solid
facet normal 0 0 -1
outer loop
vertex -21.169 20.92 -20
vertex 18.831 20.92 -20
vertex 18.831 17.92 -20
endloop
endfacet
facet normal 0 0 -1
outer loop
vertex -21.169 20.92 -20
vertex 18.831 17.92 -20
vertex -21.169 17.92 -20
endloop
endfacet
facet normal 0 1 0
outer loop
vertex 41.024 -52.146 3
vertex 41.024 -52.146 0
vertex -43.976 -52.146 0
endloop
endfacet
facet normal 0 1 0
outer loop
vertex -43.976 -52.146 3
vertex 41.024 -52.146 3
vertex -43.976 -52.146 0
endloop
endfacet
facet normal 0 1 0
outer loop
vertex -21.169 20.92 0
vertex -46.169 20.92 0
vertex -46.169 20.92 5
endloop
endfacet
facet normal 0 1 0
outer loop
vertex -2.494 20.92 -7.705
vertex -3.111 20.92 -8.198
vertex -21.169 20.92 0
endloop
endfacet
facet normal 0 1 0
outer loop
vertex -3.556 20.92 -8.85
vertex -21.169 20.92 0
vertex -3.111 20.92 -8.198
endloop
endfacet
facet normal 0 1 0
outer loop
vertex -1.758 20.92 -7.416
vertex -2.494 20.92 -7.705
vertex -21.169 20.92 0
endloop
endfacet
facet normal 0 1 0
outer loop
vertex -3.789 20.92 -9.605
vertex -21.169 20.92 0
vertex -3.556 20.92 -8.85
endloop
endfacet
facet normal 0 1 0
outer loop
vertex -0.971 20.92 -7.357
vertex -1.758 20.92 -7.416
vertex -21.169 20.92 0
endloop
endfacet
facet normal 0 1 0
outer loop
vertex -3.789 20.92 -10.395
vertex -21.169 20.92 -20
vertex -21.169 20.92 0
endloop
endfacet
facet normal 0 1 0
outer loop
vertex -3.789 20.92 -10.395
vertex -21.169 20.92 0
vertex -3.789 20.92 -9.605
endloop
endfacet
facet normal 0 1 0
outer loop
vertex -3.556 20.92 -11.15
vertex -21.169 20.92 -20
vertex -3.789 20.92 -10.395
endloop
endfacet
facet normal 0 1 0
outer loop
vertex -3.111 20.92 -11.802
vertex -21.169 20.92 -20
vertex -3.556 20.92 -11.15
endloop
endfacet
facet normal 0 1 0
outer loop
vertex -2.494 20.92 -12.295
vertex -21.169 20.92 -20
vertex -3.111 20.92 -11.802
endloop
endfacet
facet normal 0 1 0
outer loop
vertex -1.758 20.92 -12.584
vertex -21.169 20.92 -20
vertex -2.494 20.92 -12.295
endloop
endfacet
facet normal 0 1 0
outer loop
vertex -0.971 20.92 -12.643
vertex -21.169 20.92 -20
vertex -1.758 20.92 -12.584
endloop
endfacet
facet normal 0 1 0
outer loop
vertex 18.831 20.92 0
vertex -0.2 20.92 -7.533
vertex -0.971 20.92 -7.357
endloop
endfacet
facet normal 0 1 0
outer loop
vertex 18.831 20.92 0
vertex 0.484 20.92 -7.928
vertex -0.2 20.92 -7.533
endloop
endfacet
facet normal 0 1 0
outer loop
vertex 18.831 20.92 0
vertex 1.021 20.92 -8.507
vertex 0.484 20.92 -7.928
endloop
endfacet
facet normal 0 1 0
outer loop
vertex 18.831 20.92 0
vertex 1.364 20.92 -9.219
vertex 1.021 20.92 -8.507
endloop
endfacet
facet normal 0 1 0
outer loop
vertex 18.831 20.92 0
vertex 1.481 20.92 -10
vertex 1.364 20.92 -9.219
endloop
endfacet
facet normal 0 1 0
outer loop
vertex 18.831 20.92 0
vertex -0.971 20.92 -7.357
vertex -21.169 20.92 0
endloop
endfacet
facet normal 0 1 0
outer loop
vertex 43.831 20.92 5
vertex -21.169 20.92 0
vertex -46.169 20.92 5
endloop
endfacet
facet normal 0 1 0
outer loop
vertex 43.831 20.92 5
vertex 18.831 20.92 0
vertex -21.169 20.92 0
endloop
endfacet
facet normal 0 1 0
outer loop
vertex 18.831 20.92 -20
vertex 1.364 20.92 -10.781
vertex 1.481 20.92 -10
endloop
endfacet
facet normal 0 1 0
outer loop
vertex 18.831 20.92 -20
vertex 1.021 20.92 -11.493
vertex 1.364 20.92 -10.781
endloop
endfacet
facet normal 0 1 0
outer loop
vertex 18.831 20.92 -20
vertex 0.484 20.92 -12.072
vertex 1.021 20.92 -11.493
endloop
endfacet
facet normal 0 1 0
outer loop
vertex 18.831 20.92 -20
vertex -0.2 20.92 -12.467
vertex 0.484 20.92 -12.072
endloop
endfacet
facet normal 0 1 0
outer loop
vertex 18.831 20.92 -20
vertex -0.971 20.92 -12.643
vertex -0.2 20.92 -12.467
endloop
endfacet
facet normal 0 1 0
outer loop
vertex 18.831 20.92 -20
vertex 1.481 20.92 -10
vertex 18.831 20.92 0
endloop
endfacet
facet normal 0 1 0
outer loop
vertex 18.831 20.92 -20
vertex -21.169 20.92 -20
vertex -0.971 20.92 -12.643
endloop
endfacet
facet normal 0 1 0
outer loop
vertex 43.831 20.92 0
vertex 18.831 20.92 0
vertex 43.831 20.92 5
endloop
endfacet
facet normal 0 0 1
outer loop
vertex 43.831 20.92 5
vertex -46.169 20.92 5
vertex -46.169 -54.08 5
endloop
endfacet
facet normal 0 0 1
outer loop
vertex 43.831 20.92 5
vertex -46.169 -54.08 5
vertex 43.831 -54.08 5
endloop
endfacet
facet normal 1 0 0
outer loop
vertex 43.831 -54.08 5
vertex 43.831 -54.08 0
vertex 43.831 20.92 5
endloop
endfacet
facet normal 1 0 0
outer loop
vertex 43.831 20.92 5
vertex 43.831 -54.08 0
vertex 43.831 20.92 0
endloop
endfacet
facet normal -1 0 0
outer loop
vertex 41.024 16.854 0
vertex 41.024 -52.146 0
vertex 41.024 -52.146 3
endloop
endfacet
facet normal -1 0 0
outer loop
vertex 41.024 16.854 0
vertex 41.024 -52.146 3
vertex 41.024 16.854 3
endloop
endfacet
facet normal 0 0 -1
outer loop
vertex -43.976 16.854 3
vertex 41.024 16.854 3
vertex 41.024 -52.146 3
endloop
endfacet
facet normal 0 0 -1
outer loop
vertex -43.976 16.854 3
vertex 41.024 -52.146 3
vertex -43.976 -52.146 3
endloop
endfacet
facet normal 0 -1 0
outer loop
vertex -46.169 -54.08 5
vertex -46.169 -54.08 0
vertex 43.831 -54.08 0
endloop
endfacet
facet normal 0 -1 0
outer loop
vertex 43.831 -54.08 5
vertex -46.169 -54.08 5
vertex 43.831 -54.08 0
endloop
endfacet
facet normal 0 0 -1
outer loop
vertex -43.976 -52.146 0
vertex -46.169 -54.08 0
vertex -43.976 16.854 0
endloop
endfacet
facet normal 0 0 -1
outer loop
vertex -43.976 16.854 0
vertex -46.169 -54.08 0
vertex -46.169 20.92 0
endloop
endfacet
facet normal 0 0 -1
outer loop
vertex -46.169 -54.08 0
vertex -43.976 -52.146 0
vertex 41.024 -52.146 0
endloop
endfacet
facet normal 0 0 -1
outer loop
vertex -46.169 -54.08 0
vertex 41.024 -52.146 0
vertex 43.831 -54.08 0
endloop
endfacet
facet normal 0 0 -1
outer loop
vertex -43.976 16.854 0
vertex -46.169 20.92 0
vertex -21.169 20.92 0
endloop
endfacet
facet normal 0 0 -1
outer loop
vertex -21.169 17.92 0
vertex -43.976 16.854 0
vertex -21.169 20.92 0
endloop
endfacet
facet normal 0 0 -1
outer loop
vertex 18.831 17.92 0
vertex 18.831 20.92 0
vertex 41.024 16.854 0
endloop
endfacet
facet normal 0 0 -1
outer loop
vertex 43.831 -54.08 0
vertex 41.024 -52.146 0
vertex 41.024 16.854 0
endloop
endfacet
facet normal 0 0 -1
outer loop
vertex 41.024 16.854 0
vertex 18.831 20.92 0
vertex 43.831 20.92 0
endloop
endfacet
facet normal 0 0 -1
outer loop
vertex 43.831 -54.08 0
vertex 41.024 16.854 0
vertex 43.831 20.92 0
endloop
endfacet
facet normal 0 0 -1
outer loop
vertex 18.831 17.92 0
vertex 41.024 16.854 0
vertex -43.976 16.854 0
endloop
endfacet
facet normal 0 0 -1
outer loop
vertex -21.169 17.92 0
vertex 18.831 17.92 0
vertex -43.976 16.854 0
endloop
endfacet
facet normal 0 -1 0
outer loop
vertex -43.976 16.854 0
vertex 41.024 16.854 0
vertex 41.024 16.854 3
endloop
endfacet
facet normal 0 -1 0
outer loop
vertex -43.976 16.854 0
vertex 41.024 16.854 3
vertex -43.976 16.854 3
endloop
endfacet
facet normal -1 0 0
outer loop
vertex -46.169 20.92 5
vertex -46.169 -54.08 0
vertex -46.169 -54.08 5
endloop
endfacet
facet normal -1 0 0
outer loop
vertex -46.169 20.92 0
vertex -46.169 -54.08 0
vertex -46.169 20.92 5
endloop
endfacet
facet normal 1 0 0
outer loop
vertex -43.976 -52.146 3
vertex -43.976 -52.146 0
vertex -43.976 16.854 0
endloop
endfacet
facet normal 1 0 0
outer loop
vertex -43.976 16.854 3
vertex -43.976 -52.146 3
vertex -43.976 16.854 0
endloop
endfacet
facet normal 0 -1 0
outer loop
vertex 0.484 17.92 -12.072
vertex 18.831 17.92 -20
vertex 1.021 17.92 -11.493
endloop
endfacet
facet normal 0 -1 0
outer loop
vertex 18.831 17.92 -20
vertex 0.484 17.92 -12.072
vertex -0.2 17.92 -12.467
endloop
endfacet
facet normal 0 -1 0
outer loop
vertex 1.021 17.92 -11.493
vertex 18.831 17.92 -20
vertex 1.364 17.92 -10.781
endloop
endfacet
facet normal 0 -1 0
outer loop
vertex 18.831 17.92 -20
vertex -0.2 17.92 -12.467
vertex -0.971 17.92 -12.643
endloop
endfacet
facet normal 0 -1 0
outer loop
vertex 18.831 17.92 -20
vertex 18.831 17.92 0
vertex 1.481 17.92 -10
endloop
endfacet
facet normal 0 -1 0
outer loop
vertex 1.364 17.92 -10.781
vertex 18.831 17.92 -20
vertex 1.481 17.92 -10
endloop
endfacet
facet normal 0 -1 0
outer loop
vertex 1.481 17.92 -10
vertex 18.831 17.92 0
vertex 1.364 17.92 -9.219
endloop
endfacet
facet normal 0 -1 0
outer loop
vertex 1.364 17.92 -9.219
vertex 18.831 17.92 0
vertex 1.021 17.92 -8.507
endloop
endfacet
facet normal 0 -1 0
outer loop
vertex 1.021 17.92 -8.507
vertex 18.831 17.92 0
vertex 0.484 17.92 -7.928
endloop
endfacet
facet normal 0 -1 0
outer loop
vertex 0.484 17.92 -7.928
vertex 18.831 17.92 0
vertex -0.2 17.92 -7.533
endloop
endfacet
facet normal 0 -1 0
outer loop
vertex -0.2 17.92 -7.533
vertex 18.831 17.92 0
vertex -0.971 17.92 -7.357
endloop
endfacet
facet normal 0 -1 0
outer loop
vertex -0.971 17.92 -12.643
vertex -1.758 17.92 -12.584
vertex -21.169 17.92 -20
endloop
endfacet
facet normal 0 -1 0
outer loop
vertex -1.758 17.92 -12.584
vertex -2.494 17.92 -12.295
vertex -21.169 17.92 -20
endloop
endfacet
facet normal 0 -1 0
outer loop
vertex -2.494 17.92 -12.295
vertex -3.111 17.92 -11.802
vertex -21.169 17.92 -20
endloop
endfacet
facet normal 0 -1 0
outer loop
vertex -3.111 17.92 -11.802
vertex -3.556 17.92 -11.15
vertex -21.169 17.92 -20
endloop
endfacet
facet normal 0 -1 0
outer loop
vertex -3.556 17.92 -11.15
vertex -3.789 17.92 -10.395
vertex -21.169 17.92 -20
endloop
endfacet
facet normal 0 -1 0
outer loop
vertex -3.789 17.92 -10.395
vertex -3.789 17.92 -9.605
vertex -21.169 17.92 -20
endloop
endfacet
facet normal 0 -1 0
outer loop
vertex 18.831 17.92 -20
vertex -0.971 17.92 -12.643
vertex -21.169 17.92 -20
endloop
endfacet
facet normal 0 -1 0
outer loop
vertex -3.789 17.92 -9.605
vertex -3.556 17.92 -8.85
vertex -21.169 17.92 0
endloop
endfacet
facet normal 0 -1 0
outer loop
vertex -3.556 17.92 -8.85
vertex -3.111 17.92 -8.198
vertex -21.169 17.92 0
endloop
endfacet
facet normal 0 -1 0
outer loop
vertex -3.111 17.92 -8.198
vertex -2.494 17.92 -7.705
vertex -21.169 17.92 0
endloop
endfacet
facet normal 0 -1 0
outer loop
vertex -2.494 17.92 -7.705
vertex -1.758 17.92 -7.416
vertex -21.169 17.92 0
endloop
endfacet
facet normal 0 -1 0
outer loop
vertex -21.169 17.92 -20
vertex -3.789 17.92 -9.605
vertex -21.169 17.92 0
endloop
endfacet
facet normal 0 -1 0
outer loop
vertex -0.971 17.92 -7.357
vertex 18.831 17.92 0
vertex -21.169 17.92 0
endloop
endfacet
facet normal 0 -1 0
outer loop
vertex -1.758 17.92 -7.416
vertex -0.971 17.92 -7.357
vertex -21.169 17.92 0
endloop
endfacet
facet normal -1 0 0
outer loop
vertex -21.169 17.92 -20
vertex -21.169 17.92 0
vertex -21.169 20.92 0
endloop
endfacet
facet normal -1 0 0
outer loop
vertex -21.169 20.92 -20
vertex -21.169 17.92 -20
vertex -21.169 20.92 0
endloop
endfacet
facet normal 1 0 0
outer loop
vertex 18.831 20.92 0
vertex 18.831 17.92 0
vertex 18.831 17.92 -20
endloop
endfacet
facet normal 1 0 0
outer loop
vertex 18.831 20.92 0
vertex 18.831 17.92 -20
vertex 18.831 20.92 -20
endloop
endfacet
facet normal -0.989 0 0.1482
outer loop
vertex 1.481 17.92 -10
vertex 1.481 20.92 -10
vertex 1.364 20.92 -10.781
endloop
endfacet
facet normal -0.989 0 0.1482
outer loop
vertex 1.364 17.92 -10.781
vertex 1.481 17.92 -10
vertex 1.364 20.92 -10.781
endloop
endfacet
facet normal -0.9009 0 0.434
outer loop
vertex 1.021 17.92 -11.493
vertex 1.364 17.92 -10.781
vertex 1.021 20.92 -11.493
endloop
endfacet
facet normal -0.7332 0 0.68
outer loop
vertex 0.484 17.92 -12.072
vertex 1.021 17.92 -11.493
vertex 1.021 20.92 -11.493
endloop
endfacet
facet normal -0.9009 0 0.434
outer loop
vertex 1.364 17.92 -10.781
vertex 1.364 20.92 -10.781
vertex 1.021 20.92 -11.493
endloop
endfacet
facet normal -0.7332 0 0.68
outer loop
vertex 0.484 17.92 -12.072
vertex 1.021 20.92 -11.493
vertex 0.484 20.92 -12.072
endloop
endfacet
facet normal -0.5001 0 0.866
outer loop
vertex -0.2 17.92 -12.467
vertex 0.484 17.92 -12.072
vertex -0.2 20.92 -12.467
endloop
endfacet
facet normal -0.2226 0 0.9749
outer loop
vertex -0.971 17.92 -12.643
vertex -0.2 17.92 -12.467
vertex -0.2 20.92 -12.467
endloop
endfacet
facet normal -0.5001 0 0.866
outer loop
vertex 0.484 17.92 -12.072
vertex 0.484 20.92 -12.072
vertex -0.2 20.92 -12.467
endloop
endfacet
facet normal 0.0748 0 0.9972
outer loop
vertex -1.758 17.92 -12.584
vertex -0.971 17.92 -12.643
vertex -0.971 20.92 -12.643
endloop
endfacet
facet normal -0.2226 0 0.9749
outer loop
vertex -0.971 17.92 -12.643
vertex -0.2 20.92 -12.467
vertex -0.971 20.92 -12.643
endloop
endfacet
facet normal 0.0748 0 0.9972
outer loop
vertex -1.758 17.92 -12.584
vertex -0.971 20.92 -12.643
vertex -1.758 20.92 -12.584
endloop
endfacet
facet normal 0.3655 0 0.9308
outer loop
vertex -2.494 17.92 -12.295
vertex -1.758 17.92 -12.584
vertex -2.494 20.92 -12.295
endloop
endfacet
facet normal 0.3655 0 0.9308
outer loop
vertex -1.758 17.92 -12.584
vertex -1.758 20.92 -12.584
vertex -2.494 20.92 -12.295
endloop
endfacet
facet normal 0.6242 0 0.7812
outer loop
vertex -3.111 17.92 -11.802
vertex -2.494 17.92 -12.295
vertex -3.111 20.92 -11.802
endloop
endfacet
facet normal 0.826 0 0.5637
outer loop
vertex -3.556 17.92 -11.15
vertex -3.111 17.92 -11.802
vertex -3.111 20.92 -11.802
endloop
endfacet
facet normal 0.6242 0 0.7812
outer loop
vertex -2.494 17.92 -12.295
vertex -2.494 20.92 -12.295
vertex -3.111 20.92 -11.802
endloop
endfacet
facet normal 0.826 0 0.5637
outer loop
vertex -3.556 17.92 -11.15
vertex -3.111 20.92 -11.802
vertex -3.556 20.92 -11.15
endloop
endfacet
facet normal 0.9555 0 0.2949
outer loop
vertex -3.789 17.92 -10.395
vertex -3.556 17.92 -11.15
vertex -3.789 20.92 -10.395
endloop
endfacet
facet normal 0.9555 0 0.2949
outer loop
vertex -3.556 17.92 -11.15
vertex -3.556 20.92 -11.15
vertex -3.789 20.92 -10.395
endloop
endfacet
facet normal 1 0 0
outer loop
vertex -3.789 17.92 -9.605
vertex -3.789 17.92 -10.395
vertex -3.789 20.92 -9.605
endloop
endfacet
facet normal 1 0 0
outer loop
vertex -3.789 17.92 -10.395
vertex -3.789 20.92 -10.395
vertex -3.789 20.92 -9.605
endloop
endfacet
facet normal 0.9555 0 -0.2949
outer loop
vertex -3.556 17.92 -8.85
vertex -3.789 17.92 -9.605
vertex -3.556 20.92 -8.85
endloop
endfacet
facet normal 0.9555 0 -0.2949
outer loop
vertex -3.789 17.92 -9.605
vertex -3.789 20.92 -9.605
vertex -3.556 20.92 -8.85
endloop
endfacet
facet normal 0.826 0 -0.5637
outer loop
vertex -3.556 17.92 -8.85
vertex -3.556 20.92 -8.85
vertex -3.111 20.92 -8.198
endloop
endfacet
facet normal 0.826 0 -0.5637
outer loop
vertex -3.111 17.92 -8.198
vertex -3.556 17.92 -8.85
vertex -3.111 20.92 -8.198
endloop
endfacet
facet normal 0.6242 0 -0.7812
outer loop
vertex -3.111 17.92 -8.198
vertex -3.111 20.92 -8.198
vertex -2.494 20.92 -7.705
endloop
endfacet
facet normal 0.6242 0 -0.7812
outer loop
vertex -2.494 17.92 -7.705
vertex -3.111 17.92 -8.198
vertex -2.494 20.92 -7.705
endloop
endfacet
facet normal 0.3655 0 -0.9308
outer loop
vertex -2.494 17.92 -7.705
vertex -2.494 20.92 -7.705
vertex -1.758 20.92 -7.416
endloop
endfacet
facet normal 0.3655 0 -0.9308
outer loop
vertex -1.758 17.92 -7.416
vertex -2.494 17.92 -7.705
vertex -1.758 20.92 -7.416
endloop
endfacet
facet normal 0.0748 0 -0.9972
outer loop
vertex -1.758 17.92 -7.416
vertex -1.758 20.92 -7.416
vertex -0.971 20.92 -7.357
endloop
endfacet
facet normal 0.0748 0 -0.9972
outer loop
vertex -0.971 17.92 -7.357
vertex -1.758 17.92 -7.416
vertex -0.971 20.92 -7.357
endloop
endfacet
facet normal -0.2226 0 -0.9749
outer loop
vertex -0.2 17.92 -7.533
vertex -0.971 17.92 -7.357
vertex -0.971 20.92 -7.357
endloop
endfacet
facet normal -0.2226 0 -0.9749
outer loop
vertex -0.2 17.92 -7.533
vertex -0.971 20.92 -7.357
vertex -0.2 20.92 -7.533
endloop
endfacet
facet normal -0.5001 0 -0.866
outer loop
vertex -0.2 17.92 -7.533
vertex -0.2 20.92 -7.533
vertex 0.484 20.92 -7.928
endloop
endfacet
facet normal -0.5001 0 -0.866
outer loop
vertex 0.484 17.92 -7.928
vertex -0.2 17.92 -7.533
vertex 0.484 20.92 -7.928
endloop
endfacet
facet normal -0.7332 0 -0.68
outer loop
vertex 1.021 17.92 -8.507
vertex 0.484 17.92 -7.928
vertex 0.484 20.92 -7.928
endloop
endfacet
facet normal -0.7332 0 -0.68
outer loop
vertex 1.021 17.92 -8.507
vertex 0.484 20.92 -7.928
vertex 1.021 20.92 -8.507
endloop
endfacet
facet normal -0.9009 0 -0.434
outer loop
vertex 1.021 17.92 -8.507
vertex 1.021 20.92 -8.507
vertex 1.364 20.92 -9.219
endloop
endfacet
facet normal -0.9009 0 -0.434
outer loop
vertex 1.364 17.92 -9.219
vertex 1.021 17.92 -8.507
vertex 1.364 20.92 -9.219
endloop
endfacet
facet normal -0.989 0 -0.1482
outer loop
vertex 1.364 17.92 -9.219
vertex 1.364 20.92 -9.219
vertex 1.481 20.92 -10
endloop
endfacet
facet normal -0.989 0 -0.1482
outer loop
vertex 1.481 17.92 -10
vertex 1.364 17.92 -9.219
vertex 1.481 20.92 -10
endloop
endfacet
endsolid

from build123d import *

# Parameters (mm, degrees)
SKETCH_1_W          = 90
SKETCH_1_H          = 75
EXTRUDE_1_DEPTH     = 5
SKETCH_3_W          = 40
SKETCH_3_H          = 3
EXTRUDE_2_DEPTH     = 20
SKETCH_4_R          = 2.65
CUT_EXTRUDE_2_DEPTH = 20
SKETCH_5_W          = 85
SKETCH_5_H          = 69
CUT_EXTRUDE_3_DEPTH = 3


with BuildPart() as part:
    # 草图1 → 凸台-拉伸1 (new body)
    with BuildSketch(Plane.XY):
        with Locations((-1.168582375, -16.58045977)):
            Rectangle(SKETCH_1_W, SKETCH_1_H)
    extrude(amount=EXTRUDE_1_DEPTH)

    # 草图3 → 凸台-拉伸2 (add)
    with BuildSketch(Plane(origin=(0, 0, 0), x_dir=(-1, 0, 0), z_dir=(0, 0, -1))):
        with Locations((1.168582375, 19.41954023)):
            Rectangle(SKETCH_3_W, SKETCH_3_H)
    extrude(amount=EXTRUDE_2_DEPTH)

    # 草图4 → 切除-拉伸2 (cut)
    with BuildSketch(Plane(origin=(0, 20.91954023, 0), x_dir=(1, 0, 0), z_dir=(0, 1, 0))):
        with Locations((-1.168582375, 10)):
            Circle(SKETCH_4_R)
    extrude(amount=-CUT_EXTRUDE_2_DEPTH, mode=Mode.SUBTRACT)

    # 草图5 → 切除-拉伸3 (cut)
    with BuildSketch(Plane(origin=(0, 0, 0), x_dir=(-1, 0, 0), z_dir=(0, 0, -1))):
        with Locations((1.475961606, -17.646255622)):
            Rectangle(SKETCH_5_W, SKETCH_5_H)
    extrude(amount=-CUT_EXTRUDE_3_DEPTH, mode=Mode.SUBTRACT)


solid = part.part
